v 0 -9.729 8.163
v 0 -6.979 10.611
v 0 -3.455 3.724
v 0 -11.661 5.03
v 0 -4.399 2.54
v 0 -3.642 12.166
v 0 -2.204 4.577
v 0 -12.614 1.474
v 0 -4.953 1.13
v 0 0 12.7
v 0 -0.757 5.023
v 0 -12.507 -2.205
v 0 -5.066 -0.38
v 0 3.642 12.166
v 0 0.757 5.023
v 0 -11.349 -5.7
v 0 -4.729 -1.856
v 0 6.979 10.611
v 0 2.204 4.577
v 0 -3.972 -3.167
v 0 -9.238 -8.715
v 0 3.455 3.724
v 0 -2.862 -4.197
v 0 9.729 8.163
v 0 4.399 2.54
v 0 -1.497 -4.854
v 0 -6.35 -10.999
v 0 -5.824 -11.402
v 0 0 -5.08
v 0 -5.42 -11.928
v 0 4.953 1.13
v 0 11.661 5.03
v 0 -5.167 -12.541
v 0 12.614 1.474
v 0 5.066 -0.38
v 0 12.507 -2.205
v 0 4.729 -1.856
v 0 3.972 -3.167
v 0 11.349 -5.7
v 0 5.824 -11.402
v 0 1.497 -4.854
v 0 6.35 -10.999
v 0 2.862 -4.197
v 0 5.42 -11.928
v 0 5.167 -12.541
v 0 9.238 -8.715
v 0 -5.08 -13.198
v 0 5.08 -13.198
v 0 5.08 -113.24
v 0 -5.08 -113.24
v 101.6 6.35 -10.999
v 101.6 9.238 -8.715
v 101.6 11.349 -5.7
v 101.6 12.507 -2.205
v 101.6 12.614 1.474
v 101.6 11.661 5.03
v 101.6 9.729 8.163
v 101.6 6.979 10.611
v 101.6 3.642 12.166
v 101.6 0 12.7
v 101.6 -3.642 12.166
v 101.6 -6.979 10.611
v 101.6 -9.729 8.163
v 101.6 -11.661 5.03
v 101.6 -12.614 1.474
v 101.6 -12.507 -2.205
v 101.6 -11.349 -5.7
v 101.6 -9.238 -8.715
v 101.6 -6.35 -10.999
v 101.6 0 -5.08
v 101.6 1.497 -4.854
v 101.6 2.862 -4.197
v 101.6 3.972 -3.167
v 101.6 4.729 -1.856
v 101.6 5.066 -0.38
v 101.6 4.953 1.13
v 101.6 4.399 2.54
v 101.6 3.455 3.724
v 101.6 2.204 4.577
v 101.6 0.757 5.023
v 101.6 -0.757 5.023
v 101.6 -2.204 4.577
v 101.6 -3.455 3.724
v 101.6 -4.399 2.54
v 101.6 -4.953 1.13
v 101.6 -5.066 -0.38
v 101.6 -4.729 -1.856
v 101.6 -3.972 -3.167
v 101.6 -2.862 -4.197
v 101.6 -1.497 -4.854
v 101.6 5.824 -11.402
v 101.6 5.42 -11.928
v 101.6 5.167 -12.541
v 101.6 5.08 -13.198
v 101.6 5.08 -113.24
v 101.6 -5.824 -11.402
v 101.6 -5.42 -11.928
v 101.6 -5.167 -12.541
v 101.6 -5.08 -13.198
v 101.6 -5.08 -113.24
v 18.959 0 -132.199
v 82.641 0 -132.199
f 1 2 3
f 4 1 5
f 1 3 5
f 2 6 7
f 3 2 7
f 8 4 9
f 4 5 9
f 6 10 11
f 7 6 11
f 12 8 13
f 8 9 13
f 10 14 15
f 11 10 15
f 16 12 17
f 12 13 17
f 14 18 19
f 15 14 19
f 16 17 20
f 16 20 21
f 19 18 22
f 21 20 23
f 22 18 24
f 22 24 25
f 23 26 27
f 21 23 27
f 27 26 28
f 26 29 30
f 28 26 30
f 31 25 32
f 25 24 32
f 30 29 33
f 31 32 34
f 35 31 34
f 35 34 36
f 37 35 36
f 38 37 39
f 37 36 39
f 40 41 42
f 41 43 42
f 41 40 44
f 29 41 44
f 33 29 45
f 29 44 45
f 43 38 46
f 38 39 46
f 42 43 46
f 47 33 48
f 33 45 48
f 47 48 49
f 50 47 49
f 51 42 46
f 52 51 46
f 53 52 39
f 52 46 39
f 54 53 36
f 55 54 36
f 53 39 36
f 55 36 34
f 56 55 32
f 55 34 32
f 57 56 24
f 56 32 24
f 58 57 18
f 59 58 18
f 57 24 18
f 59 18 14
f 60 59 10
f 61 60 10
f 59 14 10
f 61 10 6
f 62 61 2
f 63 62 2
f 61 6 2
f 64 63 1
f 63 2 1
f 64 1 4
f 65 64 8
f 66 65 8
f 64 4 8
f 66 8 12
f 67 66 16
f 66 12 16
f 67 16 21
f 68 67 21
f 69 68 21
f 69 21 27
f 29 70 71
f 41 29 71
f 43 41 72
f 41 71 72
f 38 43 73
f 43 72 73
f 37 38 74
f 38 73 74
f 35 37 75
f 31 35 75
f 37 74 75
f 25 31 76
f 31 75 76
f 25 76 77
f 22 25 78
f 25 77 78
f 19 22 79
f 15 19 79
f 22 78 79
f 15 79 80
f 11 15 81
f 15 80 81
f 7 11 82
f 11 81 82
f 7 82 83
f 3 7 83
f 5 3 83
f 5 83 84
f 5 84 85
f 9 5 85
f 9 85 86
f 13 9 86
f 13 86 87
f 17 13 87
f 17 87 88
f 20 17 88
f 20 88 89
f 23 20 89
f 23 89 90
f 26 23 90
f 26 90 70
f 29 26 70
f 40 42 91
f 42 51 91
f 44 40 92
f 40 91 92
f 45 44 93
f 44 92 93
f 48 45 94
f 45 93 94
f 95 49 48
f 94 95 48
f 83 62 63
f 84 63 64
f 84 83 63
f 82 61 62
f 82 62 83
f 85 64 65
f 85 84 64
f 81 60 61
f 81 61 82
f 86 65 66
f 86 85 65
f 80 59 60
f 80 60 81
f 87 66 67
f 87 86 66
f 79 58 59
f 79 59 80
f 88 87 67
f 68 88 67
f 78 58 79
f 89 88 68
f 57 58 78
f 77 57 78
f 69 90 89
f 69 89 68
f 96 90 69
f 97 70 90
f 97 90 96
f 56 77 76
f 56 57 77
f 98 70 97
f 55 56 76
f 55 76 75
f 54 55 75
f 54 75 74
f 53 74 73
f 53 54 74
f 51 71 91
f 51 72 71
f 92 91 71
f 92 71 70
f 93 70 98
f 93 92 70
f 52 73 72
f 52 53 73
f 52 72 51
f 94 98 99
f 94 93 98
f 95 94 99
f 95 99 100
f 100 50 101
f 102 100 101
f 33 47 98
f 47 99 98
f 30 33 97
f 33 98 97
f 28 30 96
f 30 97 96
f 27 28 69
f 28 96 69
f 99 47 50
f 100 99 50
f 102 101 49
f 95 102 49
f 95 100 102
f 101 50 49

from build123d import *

# Parameters (mm, degrees)
BOSS_EXTRUDE1_DEPTH     = 101.6
SKETCH5_R               = 5.08
CUT_EXTRUDE4_DEPTH      = 168.213364787
CUT_EXTRUDE5_DEPTH      = 168.213364787
CUT_EXTRUDE5_DEPTH_BACK = 168.213364787
FILLET1_R               = 2.54


with BuildPart() as part:
    # Sketch1 → Boss-Extrude1 (new body)
    with BuildSketch(Plane(origin=(0, 0, 0), x_dir=(0, 0, -1), z_dir=(1, 0, 0))):
        with BuildLine():
            Line((11.639742265, -5.08), (113.239742265, -5.08))
            Line((113.239742265, -5.08), (132.198560368, 0))
            Line((132.198560368, 0), (113.239742265, 5.08))
            Line((113.239742265, 5.08), (11.639742265, 5.08))
            ThreePointArc((11.639742265, 5.08), (-12.7, 0), (11.639742265, -5.08))
        make_face()
    extrude(amount=BOSS_EXTRUDE1_DEPTH)

    # Sketch5 → Cut-Extrude4 (cut, through all)
    with BuildSketch(Plane(origin=(101.6, 0, 0), x_dir=(0, 0, -1), z_dir=(1, 0, 0))):
        Circle(SKETCH5_R)
    extrude(amount=-CUT_EXTRUDE4_DEPTH, mode=Mode.SUBTRACT)

    # Sketch6 → Cut-Extrude5 (cut, two sides: drawn at the far end of the back side and taken through both)
    with BuildSketch(Plane(origin=(0, 0, 0), x_dir=(1, 0, 0), z_dir=(0, 1, 0)).offset(-CUT_EXTRUDE5_DEPTH_BACK)):
        Polygon((0, 132.198560368), (0, 113.239742265), (18.958818102, 132.198560368), align=None)
        Polygon((101.6, 132.198560368), (101.6, 113.239742265), (82.641181898, 132.198560368), align=None)
    extrude(amount=CUT_EXTRUDE5_DEPTH + CUT_EXTRUDE5_DEPTH_BACK, mode=Mode.SUBTRACT)

    # Fillet1
    fillet1_edges = [part.edges().sort_by_distance(p)[0] for p in [
        (50.8, 5.08, -11.639742265),
        (50.8, -5.08, -11.639742265),
    ]]
    fillet(fillet1_edges, radius=FILLET1_R)


solid = part.part
